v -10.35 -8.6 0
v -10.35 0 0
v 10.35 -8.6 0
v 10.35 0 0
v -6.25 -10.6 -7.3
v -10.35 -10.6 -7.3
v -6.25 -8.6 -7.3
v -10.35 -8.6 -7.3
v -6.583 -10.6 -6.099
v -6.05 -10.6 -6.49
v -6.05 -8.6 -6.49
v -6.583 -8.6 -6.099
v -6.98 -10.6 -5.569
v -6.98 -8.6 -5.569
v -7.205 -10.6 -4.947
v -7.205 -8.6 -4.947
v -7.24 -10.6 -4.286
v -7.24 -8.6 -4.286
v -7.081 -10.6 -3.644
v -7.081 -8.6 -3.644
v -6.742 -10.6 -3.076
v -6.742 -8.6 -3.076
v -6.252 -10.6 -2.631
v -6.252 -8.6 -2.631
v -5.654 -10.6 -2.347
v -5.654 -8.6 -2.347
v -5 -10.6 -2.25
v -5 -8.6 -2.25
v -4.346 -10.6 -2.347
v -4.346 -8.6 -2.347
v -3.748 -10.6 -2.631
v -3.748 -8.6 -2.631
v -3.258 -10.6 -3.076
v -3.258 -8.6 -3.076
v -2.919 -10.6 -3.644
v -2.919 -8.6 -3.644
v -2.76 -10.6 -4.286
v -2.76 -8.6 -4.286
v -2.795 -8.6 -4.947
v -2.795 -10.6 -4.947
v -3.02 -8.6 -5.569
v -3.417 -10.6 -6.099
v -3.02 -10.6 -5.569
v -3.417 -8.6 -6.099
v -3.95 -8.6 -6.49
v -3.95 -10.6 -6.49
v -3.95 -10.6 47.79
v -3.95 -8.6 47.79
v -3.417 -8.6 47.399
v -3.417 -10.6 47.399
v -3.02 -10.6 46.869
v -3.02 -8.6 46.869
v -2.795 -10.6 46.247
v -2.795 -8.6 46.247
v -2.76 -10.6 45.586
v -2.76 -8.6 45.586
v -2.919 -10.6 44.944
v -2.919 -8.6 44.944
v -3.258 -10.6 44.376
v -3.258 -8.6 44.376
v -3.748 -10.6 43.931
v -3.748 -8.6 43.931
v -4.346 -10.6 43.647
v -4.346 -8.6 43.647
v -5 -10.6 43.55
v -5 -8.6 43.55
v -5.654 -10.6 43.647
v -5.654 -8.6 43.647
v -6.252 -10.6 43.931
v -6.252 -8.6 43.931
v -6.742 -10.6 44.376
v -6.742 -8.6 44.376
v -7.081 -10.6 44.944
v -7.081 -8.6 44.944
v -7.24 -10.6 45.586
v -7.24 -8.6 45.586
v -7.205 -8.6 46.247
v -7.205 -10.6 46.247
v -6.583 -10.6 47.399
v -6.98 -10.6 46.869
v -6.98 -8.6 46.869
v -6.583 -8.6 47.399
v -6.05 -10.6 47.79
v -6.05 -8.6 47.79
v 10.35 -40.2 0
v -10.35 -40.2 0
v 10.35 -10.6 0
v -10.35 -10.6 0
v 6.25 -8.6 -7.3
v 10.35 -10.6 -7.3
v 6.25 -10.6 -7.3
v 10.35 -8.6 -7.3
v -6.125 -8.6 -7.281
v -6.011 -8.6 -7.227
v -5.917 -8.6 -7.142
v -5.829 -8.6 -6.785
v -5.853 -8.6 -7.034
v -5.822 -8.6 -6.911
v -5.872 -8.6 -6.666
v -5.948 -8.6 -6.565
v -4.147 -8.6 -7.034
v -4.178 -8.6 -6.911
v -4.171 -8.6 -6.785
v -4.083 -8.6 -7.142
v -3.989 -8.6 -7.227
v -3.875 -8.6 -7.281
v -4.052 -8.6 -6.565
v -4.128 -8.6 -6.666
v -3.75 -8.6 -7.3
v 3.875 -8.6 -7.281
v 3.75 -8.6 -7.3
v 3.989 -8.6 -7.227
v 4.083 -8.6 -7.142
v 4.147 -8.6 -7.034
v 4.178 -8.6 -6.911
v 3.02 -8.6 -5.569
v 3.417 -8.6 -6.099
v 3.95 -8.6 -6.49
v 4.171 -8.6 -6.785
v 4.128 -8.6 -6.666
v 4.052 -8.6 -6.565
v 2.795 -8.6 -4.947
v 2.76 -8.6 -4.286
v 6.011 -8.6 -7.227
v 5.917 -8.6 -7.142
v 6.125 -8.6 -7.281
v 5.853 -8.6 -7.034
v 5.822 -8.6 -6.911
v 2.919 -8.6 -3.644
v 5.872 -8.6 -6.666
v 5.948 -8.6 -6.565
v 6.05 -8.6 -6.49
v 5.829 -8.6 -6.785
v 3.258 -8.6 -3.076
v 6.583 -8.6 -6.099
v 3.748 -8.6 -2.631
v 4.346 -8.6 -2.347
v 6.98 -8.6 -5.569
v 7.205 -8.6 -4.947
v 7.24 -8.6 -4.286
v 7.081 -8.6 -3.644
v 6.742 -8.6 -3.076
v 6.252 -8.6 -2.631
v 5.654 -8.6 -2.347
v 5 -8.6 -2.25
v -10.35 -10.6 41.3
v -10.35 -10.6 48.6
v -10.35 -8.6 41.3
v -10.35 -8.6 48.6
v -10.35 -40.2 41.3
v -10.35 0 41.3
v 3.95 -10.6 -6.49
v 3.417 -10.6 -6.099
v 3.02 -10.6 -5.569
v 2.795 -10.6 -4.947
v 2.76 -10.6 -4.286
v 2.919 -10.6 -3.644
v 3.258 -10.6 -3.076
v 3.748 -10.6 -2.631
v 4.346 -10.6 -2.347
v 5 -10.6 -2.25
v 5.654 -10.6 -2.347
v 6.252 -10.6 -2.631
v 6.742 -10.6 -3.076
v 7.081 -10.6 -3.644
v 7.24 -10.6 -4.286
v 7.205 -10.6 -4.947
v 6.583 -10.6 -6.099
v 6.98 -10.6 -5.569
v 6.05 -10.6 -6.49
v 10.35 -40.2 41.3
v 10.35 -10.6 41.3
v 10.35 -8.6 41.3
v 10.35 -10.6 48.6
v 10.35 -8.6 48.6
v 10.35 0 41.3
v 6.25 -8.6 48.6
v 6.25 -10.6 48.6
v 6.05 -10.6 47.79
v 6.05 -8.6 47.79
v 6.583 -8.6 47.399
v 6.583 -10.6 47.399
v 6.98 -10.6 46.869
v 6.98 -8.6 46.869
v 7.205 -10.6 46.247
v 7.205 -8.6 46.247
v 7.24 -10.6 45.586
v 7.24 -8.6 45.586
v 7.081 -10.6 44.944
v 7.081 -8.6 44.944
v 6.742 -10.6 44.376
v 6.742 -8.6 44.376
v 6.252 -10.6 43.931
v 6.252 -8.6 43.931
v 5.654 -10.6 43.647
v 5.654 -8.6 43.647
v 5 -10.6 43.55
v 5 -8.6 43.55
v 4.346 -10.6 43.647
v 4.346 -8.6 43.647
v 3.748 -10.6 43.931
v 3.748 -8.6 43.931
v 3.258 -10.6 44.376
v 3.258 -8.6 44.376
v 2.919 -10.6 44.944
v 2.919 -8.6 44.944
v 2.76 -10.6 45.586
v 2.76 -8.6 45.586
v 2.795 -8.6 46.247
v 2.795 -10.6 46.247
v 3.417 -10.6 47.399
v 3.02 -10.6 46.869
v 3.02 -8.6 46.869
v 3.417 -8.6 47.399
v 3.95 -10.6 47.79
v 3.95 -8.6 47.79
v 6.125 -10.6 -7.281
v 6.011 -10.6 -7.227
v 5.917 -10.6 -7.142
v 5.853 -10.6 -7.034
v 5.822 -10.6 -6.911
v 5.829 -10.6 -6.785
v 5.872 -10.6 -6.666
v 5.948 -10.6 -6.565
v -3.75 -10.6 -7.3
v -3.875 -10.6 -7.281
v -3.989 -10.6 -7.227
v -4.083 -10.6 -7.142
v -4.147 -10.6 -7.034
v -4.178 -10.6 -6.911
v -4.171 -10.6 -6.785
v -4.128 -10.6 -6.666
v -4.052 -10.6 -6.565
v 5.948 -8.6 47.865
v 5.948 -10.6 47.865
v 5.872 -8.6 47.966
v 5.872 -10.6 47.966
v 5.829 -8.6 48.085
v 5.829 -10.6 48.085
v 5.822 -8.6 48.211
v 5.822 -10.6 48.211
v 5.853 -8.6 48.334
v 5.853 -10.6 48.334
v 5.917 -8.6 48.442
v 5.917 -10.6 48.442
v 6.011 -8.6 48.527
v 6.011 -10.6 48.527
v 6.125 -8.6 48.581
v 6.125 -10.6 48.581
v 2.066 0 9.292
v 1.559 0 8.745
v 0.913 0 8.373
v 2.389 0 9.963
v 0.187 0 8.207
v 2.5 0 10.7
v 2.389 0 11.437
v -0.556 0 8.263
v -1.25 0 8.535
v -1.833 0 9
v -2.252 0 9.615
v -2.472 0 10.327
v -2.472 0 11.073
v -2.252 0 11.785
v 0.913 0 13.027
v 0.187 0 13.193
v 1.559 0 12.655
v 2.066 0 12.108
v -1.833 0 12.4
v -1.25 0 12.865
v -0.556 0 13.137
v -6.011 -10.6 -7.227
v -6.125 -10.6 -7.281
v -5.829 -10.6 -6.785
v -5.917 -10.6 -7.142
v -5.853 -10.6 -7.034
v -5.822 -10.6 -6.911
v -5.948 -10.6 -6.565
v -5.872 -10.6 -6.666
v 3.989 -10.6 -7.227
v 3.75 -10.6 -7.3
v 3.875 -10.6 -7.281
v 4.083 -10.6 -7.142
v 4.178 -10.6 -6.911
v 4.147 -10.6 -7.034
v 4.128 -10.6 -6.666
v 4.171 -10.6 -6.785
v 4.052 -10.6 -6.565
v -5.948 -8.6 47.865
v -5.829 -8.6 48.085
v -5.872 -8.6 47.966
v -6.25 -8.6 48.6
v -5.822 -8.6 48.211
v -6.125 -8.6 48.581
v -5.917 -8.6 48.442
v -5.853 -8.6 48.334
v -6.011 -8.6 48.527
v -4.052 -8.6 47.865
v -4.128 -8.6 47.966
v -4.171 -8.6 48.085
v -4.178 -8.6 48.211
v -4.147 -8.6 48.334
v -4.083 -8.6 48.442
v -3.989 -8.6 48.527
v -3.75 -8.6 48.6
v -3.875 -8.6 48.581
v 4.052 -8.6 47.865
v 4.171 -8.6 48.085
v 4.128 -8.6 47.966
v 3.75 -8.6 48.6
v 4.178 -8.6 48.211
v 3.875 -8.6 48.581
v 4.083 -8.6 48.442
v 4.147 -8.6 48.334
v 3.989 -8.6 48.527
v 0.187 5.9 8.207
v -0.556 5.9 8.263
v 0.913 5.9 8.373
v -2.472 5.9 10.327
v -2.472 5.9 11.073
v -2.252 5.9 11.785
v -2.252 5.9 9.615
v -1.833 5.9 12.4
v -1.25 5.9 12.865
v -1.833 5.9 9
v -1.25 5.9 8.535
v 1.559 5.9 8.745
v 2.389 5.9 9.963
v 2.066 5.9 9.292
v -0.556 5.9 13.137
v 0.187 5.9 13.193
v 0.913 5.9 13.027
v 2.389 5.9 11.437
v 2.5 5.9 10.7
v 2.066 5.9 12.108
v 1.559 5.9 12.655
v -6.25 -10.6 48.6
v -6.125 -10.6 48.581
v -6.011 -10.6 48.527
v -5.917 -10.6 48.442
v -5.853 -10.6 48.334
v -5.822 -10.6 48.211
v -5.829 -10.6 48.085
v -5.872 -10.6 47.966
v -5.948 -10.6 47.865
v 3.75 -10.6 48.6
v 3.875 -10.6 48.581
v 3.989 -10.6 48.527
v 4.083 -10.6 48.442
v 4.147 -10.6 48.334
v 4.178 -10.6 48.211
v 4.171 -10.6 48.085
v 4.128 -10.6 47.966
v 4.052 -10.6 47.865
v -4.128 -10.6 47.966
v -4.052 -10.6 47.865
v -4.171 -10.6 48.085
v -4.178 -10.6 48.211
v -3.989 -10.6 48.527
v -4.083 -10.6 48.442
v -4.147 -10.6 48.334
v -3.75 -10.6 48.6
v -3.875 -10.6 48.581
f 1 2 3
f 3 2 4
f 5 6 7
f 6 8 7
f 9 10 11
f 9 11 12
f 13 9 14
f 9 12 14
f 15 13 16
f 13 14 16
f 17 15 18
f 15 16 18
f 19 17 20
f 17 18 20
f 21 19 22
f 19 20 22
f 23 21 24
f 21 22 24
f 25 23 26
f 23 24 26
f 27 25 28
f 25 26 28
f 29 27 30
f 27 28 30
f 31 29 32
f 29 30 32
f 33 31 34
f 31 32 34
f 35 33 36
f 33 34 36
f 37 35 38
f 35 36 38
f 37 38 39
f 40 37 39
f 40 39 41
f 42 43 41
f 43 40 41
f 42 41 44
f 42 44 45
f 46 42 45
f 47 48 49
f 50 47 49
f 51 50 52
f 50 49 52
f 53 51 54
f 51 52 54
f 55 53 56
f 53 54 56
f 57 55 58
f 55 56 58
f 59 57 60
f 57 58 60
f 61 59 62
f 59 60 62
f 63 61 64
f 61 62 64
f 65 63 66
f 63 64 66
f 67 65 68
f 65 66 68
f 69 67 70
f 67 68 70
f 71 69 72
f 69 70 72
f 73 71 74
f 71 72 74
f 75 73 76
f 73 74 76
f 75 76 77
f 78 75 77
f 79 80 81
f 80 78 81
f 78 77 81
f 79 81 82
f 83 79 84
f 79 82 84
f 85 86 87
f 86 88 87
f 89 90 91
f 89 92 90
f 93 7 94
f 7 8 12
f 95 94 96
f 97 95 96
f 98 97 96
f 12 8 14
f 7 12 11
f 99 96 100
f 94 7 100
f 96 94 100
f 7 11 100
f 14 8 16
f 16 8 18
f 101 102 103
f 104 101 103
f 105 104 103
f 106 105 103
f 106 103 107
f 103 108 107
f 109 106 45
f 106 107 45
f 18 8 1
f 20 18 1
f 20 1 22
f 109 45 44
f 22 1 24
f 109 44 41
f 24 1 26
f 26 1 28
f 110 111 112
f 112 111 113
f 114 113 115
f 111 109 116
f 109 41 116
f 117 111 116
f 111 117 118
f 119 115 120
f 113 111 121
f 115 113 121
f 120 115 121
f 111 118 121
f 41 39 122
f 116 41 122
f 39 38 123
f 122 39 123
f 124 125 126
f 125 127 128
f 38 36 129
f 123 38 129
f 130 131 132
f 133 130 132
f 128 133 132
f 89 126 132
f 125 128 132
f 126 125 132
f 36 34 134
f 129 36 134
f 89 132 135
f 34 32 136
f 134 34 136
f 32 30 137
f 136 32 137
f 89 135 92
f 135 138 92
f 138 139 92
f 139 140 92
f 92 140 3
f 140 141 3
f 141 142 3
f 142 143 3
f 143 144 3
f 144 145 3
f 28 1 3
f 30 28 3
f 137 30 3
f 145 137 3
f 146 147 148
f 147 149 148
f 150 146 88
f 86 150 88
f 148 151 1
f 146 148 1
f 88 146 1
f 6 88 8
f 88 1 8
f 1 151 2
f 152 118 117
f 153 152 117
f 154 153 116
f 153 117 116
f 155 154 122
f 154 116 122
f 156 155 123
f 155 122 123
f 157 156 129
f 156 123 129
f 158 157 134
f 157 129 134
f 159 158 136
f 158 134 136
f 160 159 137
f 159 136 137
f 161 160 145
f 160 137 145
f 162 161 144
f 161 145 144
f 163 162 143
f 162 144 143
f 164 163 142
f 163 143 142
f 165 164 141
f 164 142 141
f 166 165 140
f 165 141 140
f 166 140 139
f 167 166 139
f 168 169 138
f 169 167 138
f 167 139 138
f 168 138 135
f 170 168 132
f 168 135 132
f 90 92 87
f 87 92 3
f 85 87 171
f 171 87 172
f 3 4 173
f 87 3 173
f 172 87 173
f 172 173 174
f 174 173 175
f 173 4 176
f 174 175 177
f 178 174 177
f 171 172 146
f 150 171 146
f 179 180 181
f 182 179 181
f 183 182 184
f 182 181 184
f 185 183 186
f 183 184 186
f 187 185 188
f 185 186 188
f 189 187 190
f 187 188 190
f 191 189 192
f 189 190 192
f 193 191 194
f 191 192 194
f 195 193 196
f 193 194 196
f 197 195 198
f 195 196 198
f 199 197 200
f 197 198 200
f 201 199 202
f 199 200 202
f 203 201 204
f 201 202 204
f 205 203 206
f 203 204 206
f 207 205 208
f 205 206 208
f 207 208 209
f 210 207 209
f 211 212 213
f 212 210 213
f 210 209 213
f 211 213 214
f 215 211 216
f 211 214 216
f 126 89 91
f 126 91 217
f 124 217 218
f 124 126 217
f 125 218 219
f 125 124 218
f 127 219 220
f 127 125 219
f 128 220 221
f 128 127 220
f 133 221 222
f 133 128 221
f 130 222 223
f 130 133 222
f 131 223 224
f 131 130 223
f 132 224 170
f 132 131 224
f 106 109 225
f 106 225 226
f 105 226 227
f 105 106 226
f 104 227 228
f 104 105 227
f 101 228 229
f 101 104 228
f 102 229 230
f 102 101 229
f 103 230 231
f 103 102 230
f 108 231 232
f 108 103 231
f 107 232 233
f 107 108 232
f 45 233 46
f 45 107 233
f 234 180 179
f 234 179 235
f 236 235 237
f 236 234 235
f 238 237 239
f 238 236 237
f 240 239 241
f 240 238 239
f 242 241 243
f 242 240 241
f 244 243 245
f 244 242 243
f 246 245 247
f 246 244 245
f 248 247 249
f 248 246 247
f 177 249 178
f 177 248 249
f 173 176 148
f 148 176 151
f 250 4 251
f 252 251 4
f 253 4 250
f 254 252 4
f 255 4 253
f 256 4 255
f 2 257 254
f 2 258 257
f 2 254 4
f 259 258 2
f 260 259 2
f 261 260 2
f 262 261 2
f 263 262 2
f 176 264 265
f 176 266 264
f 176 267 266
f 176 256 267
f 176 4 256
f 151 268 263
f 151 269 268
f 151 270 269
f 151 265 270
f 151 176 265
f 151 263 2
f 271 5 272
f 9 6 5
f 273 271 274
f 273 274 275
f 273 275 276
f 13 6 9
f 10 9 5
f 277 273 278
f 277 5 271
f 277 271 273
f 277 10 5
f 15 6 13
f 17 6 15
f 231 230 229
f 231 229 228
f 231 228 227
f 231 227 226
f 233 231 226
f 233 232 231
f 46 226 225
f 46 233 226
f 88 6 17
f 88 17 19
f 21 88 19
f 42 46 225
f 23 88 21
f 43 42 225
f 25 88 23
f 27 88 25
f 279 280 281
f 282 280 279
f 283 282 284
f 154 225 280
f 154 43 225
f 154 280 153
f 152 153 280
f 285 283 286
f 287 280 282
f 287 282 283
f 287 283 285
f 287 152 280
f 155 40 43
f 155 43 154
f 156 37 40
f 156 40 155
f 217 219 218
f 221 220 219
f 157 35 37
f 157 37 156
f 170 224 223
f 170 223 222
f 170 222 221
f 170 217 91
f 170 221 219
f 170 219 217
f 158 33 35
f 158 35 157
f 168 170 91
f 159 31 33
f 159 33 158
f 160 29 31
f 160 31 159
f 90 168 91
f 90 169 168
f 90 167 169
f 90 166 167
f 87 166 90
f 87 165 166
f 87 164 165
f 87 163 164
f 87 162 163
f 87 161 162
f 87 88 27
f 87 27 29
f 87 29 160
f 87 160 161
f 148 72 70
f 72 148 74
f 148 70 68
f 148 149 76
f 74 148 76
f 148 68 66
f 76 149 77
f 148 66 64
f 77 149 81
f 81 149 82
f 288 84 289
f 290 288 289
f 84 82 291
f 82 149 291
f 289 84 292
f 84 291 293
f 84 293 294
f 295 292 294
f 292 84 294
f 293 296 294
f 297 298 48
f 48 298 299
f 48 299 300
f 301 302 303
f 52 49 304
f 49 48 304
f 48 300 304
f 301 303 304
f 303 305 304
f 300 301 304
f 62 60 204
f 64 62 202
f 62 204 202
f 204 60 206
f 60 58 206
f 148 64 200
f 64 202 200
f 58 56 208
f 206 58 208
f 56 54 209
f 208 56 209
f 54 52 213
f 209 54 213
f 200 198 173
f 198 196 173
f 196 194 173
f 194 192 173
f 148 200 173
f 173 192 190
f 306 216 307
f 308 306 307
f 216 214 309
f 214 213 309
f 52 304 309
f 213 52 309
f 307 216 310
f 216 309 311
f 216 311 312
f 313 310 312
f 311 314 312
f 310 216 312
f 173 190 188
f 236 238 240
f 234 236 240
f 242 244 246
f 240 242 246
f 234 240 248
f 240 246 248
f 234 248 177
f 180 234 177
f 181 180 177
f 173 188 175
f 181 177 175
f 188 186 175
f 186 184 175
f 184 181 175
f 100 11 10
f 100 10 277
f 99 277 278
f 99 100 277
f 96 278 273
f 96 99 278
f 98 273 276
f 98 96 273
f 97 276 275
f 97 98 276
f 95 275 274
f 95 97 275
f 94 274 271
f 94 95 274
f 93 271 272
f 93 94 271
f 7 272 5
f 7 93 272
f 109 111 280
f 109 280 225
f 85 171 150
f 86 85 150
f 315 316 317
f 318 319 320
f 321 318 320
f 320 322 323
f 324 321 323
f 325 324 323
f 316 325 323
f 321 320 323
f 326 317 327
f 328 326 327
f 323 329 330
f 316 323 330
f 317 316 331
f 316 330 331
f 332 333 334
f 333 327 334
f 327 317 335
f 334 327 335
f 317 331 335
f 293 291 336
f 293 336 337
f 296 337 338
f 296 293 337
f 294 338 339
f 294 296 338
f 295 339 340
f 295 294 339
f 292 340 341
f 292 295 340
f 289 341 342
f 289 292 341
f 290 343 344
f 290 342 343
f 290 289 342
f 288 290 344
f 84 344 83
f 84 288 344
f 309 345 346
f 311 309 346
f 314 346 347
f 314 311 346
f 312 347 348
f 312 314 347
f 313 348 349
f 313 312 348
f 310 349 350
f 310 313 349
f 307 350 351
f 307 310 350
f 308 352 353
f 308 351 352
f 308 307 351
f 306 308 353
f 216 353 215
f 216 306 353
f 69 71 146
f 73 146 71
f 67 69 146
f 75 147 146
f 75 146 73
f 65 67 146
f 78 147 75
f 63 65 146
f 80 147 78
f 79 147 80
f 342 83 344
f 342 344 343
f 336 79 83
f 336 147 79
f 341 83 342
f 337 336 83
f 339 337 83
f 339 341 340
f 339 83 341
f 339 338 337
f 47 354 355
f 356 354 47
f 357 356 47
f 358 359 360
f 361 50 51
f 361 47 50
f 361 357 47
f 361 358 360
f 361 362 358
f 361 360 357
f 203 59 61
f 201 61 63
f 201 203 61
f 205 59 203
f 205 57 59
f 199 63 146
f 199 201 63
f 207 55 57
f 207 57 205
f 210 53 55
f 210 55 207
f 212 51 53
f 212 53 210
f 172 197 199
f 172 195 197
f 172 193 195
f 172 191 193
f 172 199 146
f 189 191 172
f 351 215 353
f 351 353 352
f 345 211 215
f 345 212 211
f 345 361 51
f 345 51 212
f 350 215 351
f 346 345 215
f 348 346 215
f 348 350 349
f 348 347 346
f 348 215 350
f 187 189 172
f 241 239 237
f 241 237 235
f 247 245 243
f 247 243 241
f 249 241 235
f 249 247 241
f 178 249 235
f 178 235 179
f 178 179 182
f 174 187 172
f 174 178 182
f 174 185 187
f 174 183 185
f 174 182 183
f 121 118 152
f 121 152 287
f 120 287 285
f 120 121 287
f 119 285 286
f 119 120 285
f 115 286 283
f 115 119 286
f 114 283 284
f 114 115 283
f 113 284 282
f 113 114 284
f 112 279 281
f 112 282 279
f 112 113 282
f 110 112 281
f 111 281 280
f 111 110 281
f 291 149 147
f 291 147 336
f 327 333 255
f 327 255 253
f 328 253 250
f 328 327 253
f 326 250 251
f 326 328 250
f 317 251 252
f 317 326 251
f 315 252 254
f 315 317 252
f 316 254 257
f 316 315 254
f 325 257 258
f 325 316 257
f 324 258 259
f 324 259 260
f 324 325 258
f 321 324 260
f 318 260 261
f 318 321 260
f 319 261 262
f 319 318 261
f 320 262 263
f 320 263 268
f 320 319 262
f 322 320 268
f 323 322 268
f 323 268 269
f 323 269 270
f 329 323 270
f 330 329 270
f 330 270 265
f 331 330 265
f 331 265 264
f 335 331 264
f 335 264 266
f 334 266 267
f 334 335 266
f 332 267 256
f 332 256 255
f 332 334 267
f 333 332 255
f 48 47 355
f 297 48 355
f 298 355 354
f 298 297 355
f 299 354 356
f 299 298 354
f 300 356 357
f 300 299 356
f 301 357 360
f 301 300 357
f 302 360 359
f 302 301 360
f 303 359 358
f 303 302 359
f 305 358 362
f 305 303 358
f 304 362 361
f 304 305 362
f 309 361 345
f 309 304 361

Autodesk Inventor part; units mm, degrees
ref_plane "YZ Plane" through (0, 0, 0) normal (1, 0, 0) x (0, 1, 0)
ref_plane "XZ Plane" through (0, 0, 0) normal (0, 1, 0) x (-1, 0, 0)
ref_plane "XY Plane" through (0, 0, 0) normal (0, 0, 1) x (1, 0, 0)
sketch "Sketch1" plane through (0, 0, 0) normal (0, 1, 0) x (-1, 0, 0)
  line L0 (10.35, 0) -> (-10.35, 0)
  line L1 (-10.35, 0) -> (-10.35, 41.3)
  line L2 (-10.35, 41.3) -> (10.35, 41.3)
  line L3 (10.35, 41.3) -> (10.35, 0)
  point P0 (0, 0)
  point P1 (0, 0)
  dimension "d0" = 41.3
  dimension "d1" = 20.7
extrude "Extrusion1" add sketch "Sketch1" against normal blind 40.2
ref_plane "Work Plane2" through (0, -8.6, 0) normal (0, -1, 0) x (1, 0, 0)
ref_plane "Work Plane1" through (0, 5.9, 0) normal (0, -1, 0) x (1, 0, 0)
sketch "Sketch2" plane through (0, -8.6, 0) normal (0, -1, 0) x (1, 0, 0)
  line L0 (-10.35, 0) -> (10.35, 0) projected
  line L1 (-10.35, 41.3) -> (-10.35, 0) construction
  line L2 (-10.35, 0) -> (-10.35, -7.3)
  line L3 (-10.35, -7.3) -> (-6.25, -7.3)
  arc A0 (-6.25, -7.3) -> (-6.0496, -6.4902) centre (-6.25, -6.8703) ccw
  arc A1 (-3.9504, -6.4902) -> (-6.0496, -6.4902) centre (-5, -4.5) ccw
  arc A2 (-3.9504, -6.4902) -> (-3.75, -7.3) centre (-3.75, -6.8703) ccw
  line L4 (-3.75, -7.3) -> (0, -7.3)
  line L5 (0, -7.3) -> (0, 0) construction
  line L6 (10.35, 0) -> (10.35, -7.3)
  line L7 (10.35, -7.3) -> (6.25, -7.3)
  arc A3 (6.0496, -6.4902) -> (6.25, -7.3) centre (6.25, -6.8703) ccw
  arc A4 (6.0496, -6.4902) -> (3.9504, -6.4902) centre (5, -4.5) ccw
  arc A5 (3.75, -7.3) -> (3.9504, -6.4902) centre (3.75, -6.8703) ccw
  line L8 (3.75, -7.3) -> (0, -7.3)
  line L9 (-10.35, 20.65) -> (10.35, 20.65) construction
  line L10 (10.35, 0) -> (10.35, 41.3) construction
  line L11 (-10.35, 41.3) -> (10.35, 41.3)
  line L12 (-10.35, 41.3) -> (-10.35, 48.6)
  line L13 (-10.35, 48.6) -> (-6.25, 48.6)
  arc A6 (-6.0496, 47.7902) -> (-6.25, 48.6) centre (-6.25, 48.1703) ccw
  arc A7 (-6.0496, 47.7902) -> (-3.9504, 47.7902) centre (-5, 45.8) ccw
  arc A8 (-3.75, 48.6) -> (-3.9504, 47.7902) centre (-3.75, 48.1703) ccw
  line L14 (-3.75, 48.6) -> (0, 48.6)
  line L15 (0, 48.6) -> (0, 41.3) construction
  line L16 (10.35, 48.6) -> (6.25, 48.6)
  arc A9 (6.25, 48.6) -> (6.0496, 47.7902) centre (6.25, 48.1703) ccw
  arc A10 (3.9504, 47.7902) -> (6.0496, 47.7902) centre (5, 45.8) ccw
  arc A11 (3.9504, 47.7902) -> (3.75, 48.6) centre (3.75, 48.1703) ccw
  line L17 (3.75, 48.6) -> (0, 48.6)
  line L18 (10.35, 41.3) -> (10.35, 48.6)
  dimension "d7" = 4.5
  dimension "d8" = 10
  dimension "d9" = 55.9
  dimension "d10" = 50.3
  dimension "d11" = 2.5
extrude "Extrusion2" add sketch "Sketch2" along normal blind 2
sketch "Sketch3" plane through (0, 5.9, 0) normal (0, -1, 0) x (1, 0, 0)
  circle A0 centre (0, 10.7) radius 2.5
  arc A1 (-3.9504, -6.4902) -> (-6.0496, -6.4902) centre (-5, -4.5) ccw construction
  point P0 (0, 0)
  dimension "d17" = 5
  dimension "d18" = 15.2
extrude "Extrusion3" add sketch "Sketch3" along normal up to next
properties part number "SM-S4303R"
